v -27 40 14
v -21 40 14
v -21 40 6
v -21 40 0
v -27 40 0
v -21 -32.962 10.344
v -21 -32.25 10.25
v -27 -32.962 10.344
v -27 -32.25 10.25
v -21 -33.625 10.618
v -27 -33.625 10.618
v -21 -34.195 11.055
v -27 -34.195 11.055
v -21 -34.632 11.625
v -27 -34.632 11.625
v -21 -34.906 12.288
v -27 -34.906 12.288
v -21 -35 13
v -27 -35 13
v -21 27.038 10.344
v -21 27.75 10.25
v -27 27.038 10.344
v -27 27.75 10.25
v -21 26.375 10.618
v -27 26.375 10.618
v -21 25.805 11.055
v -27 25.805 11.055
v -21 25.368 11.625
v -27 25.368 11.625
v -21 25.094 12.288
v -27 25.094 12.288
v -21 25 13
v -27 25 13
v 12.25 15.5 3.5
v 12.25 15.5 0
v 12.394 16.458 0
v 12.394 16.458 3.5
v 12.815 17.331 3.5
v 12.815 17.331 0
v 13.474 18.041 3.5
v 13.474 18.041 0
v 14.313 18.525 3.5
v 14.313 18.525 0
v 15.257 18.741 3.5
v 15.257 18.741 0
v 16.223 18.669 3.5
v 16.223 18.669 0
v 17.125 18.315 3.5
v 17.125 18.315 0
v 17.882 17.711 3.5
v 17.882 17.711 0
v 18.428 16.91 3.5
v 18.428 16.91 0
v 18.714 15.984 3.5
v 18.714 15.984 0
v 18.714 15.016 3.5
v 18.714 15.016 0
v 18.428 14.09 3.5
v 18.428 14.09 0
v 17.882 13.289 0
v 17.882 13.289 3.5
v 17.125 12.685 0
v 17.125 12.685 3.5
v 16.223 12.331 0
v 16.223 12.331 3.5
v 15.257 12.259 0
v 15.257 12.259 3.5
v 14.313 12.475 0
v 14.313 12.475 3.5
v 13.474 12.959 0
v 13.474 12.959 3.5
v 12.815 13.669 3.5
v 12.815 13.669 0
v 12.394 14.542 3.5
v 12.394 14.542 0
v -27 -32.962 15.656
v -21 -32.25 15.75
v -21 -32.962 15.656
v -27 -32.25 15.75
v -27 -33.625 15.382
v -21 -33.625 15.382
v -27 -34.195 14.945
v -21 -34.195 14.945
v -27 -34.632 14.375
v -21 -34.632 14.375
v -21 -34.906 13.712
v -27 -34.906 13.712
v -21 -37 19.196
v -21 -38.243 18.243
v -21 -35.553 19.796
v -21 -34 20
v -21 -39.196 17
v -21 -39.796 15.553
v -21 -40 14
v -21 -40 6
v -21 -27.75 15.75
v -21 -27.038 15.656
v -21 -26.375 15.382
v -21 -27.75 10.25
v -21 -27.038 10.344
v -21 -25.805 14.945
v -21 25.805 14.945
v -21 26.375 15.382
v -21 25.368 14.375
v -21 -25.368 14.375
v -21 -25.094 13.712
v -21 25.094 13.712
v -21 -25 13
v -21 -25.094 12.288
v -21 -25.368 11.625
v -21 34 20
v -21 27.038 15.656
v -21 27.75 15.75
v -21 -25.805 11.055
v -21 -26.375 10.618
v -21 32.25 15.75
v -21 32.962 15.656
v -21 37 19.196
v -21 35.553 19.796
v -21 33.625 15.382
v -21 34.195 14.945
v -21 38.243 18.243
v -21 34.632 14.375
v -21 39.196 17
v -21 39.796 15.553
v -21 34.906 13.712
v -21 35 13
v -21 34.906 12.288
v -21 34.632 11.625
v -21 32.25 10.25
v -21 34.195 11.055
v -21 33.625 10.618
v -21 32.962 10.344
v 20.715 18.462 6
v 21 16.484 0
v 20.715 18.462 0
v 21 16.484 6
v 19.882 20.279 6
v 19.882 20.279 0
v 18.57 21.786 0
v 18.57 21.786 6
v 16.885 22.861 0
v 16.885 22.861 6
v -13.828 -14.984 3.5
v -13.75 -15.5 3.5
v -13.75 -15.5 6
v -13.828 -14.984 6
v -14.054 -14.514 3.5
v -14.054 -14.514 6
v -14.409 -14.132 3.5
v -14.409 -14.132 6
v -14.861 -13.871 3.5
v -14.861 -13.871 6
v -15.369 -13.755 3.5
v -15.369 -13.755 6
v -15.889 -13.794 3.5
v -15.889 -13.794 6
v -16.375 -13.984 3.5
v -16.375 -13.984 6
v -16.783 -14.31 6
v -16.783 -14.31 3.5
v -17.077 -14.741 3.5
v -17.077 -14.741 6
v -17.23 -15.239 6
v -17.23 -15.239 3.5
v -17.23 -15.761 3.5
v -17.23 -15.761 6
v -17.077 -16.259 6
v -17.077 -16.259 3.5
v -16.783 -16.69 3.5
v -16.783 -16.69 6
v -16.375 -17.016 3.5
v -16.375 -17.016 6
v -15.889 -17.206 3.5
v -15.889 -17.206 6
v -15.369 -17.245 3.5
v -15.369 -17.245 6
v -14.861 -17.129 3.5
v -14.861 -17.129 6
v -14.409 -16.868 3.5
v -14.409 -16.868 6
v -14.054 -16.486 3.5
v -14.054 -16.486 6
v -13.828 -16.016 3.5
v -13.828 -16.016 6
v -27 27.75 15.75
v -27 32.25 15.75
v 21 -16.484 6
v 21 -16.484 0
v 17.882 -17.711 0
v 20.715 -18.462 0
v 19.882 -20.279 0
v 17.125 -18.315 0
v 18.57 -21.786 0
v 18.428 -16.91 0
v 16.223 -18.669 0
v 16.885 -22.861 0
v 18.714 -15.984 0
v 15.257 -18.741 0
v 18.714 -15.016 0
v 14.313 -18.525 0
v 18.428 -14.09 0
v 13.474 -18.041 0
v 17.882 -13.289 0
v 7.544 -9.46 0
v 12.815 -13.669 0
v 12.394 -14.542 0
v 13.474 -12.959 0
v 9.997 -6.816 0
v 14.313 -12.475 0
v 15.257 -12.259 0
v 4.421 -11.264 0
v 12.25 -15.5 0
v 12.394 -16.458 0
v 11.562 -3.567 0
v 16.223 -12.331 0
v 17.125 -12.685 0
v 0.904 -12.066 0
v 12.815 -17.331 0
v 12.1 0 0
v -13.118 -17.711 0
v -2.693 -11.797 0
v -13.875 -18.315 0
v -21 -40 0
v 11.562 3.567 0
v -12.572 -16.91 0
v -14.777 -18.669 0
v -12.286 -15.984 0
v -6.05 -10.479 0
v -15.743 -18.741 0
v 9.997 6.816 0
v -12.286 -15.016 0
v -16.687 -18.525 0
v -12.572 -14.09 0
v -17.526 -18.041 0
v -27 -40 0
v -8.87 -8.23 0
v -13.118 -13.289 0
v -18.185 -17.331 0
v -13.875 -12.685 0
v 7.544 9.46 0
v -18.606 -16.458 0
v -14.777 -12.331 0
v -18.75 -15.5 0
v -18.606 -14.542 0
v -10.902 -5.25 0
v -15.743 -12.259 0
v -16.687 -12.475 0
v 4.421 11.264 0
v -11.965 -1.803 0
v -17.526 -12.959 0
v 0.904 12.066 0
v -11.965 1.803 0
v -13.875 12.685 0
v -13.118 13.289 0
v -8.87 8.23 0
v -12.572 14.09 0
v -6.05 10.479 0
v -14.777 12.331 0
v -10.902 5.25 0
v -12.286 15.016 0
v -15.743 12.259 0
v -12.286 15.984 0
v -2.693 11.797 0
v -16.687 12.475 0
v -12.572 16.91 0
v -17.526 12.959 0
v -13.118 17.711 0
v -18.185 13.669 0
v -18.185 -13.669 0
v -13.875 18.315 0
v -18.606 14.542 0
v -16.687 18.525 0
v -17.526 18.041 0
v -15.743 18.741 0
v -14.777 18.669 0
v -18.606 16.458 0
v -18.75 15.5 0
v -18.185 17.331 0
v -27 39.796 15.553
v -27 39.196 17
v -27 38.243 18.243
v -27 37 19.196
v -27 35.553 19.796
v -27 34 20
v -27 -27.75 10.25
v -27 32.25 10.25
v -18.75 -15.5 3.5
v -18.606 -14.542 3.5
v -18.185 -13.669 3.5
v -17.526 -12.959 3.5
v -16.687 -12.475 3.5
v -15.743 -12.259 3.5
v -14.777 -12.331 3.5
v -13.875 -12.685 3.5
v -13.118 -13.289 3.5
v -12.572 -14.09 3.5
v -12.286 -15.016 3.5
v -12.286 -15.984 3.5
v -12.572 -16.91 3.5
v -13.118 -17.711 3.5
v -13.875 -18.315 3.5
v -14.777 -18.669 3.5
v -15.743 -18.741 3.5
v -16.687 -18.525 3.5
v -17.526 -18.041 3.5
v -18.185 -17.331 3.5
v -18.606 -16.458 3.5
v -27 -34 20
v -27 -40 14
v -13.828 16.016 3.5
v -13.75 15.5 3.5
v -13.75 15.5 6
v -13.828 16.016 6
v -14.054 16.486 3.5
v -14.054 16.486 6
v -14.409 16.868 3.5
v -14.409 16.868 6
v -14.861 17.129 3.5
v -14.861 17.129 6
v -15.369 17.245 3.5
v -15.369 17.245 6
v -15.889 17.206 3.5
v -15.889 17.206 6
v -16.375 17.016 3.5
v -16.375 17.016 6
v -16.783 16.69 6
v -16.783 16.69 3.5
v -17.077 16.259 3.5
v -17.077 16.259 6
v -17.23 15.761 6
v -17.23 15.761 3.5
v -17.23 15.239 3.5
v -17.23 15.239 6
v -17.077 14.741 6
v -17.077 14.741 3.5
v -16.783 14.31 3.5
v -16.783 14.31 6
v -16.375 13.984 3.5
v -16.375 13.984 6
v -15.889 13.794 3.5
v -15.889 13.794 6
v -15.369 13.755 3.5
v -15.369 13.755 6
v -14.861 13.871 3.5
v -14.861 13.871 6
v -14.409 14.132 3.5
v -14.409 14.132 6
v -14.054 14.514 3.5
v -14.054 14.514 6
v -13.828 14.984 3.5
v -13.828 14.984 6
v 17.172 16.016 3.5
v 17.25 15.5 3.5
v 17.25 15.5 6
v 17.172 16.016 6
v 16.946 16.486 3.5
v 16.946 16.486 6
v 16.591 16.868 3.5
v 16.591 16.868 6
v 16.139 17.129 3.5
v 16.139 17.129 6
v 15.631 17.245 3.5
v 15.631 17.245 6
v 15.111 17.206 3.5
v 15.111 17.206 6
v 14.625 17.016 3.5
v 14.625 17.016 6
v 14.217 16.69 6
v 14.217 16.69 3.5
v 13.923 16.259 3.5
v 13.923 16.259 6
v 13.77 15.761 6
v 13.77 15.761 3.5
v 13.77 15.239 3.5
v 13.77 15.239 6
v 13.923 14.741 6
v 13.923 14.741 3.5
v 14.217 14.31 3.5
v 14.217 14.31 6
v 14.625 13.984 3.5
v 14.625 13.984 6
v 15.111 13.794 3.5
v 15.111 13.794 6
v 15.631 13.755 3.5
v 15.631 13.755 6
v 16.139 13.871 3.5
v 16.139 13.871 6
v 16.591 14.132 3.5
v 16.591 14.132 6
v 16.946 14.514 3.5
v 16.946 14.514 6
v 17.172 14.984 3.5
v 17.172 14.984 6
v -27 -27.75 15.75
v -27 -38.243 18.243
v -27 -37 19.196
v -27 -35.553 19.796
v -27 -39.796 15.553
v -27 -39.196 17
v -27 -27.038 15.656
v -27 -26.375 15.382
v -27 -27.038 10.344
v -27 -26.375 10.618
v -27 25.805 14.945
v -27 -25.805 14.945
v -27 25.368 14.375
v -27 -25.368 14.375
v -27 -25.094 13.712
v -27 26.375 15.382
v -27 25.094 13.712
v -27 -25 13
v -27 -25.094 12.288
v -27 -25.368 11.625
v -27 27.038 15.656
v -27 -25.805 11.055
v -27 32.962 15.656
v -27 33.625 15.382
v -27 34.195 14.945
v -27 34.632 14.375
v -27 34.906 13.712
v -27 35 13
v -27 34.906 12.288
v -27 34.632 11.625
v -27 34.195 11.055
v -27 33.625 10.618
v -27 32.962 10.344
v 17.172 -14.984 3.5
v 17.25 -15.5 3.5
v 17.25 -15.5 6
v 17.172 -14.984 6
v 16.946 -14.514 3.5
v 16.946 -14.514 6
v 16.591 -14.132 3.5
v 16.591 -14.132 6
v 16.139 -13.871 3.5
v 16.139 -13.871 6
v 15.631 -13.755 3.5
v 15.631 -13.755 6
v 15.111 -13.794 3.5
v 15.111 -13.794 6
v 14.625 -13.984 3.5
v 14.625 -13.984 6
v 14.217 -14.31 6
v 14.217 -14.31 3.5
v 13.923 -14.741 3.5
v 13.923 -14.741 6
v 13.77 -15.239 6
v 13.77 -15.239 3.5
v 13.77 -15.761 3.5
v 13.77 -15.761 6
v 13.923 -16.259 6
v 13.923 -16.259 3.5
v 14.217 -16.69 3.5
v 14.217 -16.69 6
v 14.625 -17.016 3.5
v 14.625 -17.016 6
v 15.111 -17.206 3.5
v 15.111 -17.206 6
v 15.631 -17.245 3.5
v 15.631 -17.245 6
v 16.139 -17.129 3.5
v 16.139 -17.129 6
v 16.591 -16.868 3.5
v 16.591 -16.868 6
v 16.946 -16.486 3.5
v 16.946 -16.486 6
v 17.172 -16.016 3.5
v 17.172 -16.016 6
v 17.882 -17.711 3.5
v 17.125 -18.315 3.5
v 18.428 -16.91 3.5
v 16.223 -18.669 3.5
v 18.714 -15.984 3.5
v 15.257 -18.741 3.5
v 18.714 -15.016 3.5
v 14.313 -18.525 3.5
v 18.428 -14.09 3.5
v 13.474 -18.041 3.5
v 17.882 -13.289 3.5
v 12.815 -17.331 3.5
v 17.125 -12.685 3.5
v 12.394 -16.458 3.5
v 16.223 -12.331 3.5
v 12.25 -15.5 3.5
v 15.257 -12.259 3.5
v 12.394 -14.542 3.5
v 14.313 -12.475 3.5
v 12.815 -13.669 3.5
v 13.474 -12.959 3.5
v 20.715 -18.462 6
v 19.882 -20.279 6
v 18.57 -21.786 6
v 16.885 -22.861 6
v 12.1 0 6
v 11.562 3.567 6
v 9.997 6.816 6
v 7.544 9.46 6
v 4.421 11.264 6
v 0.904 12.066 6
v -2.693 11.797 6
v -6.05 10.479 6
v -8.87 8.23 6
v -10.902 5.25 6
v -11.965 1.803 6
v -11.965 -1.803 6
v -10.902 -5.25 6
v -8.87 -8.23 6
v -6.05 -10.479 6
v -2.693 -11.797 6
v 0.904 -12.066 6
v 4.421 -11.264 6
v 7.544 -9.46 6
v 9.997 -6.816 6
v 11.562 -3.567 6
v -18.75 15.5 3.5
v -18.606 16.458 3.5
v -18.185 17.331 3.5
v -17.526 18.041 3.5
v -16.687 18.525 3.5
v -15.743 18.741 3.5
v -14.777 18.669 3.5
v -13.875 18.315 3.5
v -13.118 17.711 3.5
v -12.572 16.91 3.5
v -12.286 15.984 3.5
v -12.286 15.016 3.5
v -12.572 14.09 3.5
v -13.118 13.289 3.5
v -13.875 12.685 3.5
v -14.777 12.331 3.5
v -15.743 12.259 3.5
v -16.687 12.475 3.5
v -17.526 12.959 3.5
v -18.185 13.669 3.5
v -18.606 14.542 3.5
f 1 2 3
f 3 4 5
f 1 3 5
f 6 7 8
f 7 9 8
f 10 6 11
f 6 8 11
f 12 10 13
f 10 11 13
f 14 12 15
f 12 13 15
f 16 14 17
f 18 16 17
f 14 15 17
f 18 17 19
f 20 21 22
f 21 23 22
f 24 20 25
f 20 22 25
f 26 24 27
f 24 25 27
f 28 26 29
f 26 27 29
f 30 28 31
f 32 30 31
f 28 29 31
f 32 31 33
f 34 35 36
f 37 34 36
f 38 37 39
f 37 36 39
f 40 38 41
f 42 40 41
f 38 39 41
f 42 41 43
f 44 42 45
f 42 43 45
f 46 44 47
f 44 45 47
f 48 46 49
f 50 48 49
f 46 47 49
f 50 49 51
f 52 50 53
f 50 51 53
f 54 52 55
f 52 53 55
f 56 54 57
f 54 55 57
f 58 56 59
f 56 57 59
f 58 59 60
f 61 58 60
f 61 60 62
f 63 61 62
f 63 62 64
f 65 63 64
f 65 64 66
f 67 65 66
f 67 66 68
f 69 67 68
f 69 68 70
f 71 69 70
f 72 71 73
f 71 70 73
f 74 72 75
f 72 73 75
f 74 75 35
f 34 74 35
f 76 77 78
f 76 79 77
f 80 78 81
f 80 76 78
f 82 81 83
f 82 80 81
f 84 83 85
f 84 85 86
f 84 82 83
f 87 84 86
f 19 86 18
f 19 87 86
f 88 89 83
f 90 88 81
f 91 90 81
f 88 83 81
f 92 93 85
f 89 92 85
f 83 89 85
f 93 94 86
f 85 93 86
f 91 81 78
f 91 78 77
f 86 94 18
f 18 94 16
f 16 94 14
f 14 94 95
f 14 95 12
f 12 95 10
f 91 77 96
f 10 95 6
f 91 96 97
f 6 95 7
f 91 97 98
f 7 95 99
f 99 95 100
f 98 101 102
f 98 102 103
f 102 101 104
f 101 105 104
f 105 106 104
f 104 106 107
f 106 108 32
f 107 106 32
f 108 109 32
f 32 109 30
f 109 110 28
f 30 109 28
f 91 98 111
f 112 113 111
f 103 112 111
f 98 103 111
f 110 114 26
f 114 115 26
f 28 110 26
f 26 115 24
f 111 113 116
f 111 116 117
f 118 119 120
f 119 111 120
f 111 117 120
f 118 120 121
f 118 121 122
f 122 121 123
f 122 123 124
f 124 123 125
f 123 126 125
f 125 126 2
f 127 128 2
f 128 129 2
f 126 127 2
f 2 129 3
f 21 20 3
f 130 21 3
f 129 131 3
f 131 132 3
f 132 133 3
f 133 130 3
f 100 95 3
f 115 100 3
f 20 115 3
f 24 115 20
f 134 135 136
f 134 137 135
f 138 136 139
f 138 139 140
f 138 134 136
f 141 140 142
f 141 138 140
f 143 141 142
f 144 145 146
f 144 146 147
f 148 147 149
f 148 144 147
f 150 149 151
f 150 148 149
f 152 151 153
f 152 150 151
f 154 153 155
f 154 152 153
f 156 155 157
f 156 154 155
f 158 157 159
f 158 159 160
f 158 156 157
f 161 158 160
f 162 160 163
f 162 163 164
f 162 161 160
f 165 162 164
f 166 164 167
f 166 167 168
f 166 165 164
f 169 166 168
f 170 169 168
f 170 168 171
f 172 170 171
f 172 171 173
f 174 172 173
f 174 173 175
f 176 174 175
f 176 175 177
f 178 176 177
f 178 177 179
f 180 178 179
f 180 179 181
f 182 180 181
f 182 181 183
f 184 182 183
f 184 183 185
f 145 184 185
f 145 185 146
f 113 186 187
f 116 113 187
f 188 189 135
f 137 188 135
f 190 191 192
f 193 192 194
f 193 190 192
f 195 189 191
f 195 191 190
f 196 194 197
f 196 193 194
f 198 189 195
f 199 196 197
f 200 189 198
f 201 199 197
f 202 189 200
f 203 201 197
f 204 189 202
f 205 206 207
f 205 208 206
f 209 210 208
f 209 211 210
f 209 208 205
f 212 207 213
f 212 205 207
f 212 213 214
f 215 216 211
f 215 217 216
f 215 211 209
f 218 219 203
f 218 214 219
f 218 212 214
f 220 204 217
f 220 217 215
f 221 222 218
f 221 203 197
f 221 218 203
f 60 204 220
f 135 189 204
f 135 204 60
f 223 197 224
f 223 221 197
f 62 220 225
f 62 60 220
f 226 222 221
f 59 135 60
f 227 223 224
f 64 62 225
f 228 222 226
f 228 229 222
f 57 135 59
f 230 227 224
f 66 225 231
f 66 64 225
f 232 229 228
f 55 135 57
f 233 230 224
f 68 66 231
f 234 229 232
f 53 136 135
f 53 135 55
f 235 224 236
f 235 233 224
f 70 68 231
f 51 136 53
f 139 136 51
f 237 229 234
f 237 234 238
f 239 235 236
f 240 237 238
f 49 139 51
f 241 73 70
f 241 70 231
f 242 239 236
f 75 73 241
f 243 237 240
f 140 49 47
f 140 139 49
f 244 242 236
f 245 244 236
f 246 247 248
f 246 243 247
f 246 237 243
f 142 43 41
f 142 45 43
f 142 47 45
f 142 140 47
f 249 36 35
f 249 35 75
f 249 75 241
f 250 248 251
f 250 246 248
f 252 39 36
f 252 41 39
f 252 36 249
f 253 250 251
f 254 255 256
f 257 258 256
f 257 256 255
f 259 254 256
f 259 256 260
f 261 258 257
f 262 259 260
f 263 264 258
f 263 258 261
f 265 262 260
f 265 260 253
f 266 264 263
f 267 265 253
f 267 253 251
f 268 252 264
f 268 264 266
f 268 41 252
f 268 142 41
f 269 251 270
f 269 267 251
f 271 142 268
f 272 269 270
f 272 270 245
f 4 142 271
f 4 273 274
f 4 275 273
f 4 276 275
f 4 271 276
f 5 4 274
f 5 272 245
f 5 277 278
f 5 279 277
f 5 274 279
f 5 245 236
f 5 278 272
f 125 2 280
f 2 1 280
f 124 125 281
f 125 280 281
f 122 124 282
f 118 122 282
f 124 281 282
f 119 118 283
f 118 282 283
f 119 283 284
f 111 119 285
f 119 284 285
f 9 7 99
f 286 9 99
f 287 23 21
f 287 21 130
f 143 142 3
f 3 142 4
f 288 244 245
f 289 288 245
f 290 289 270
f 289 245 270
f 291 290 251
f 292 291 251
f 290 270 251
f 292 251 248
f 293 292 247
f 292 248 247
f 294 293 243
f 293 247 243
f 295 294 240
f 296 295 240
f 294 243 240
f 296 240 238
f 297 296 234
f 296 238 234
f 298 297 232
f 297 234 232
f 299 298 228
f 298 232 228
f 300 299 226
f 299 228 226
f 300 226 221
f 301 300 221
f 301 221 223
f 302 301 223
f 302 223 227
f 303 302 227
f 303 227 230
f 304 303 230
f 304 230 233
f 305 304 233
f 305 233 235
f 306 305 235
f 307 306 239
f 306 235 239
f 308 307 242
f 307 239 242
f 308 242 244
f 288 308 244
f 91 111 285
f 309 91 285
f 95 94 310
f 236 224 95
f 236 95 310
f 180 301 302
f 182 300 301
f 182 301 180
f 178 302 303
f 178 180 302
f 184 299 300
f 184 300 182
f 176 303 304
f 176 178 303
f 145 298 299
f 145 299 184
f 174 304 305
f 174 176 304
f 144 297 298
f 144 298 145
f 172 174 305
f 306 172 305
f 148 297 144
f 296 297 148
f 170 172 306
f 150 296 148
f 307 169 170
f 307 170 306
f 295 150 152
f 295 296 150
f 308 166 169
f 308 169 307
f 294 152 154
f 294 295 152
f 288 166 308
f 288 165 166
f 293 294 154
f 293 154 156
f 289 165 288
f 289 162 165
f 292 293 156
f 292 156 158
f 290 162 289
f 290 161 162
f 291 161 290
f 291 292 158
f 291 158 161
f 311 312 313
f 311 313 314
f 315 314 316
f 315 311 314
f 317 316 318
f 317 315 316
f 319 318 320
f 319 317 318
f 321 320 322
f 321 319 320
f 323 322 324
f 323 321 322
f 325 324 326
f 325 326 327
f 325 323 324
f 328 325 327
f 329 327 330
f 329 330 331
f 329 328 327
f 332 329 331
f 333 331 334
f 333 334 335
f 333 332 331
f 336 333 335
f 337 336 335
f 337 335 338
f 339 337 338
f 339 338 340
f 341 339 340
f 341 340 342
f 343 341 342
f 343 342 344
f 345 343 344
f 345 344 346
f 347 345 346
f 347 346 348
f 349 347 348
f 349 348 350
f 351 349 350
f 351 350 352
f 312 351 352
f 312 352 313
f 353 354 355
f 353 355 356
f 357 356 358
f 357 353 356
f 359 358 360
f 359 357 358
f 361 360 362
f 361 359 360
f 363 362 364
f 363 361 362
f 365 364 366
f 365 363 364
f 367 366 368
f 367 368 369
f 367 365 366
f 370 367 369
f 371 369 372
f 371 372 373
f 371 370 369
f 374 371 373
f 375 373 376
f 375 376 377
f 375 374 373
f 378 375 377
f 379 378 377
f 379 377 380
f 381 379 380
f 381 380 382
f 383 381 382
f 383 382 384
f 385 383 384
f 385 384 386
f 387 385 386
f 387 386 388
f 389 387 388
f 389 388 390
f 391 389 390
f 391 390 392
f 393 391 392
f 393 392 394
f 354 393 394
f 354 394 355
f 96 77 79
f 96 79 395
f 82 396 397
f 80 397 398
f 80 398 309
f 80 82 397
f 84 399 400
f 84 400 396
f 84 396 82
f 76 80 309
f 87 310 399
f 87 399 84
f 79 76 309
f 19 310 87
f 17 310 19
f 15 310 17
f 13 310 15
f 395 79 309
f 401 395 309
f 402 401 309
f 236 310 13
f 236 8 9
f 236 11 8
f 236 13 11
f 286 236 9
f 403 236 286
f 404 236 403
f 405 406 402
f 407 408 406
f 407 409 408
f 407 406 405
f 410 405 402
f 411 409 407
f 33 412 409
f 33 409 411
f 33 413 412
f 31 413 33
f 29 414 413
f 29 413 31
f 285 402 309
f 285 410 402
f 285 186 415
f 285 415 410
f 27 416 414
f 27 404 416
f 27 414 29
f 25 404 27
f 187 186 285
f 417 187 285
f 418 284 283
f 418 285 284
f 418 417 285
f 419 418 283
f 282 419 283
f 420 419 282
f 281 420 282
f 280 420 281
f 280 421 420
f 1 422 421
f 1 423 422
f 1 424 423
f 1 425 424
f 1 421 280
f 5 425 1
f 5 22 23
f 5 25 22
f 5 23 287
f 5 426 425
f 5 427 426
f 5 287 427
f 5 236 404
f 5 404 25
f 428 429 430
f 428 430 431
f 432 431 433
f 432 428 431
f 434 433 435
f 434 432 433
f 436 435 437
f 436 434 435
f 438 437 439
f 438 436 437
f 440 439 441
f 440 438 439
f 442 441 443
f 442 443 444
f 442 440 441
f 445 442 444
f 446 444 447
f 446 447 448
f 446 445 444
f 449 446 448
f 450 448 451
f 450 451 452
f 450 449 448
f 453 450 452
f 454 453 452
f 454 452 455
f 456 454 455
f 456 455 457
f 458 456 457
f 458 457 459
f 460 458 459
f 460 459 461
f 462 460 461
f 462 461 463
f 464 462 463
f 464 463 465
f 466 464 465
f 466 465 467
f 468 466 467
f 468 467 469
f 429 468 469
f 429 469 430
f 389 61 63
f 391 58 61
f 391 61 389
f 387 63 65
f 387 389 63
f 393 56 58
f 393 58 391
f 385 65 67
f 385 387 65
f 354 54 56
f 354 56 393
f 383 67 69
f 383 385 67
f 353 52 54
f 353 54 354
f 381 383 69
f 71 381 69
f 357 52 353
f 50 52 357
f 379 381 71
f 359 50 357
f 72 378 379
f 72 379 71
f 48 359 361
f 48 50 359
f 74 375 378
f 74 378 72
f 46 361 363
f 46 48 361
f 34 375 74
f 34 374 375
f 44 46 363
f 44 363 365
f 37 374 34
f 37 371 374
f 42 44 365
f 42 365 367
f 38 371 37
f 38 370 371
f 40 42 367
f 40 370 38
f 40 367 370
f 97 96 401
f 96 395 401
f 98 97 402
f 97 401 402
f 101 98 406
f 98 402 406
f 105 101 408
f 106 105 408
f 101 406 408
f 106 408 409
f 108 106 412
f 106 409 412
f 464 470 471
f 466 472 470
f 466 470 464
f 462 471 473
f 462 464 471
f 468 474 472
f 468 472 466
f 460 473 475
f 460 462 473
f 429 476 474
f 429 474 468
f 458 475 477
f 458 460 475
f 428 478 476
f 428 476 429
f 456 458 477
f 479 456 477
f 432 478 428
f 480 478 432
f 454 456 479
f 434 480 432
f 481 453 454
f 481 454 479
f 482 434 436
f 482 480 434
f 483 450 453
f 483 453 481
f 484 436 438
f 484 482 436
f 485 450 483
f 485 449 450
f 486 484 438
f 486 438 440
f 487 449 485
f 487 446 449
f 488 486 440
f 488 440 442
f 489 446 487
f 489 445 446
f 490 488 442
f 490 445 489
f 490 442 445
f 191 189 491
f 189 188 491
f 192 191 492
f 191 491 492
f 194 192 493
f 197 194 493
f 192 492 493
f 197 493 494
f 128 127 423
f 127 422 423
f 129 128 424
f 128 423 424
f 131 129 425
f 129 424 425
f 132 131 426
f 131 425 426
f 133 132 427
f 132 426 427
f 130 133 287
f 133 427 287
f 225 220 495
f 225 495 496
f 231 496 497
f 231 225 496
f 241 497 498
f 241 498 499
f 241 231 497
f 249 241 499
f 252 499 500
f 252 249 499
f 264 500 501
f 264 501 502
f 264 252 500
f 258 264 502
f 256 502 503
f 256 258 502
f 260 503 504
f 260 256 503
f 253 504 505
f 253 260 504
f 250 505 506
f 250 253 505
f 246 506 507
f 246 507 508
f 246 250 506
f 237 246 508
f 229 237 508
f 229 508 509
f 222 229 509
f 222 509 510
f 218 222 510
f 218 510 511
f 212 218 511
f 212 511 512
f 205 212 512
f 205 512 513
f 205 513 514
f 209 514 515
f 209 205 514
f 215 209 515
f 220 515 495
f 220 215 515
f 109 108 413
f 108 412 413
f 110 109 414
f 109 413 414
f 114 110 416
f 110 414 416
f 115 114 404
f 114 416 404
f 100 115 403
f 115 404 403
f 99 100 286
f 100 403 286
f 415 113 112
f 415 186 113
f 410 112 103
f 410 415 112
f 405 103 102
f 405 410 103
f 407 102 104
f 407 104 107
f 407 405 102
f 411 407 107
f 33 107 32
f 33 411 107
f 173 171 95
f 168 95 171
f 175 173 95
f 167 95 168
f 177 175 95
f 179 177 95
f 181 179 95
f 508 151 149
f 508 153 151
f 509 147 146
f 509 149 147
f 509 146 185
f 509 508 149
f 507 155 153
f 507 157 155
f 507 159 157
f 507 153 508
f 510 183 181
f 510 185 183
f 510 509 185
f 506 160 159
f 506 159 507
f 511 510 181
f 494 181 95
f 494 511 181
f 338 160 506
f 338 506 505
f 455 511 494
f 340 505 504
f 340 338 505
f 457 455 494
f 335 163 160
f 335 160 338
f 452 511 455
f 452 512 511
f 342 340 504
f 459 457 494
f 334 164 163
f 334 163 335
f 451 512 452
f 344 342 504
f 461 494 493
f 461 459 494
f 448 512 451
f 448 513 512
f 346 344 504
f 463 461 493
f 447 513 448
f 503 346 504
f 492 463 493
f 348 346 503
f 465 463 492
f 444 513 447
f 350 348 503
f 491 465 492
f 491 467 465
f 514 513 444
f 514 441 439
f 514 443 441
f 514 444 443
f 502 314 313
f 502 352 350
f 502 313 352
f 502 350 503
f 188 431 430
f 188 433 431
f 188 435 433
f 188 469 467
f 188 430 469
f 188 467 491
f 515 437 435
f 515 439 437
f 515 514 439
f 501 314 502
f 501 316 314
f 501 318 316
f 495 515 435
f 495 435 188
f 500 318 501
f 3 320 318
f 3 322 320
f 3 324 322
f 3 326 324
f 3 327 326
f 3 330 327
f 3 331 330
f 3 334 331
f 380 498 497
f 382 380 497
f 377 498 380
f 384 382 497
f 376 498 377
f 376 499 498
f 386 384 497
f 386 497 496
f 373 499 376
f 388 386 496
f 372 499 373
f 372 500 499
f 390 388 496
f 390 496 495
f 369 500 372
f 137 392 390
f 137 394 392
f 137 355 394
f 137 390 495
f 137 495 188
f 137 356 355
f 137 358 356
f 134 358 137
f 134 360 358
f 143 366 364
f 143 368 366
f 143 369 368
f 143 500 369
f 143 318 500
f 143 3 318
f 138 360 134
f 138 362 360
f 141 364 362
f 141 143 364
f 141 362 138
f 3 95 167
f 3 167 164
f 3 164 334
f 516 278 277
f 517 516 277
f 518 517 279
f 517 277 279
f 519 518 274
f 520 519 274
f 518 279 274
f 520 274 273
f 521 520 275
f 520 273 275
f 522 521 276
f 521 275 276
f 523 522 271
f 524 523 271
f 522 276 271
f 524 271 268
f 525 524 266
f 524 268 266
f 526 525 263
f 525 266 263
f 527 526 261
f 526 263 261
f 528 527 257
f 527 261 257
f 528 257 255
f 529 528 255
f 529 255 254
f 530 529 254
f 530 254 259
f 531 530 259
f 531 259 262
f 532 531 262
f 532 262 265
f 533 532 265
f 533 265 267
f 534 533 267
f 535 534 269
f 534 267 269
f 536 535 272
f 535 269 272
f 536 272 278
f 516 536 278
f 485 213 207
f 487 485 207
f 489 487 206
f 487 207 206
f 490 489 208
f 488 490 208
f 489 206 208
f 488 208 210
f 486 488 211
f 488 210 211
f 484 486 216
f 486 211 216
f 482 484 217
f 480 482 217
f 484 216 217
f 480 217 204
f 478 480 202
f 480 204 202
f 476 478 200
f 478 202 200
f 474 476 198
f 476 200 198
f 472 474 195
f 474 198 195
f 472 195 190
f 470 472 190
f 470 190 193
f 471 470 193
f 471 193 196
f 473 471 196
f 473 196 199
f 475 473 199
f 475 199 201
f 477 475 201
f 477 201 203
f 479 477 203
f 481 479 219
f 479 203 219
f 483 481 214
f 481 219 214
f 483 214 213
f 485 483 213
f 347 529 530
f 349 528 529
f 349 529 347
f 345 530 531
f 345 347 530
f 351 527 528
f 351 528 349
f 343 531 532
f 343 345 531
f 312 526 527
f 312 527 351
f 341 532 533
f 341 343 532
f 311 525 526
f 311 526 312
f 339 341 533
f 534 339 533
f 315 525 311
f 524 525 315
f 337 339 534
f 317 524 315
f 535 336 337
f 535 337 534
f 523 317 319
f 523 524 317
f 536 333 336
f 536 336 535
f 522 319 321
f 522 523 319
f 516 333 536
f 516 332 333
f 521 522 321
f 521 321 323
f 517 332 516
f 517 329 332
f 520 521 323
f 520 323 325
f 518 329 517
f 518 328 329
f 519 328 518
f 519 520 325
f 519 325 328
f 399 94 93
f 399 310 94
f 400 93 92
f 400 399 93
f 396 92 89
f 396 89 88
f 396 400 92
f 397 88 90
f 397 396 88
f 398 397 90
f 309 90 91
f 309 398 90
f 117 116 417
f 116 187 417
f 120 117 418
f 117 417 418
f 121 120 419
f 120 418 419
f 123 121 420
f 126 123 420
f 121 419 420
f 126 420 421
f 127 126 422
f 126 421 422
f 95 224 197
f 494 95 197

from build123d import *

# Parameters (mm, degrees)
SKETCH1_R           = 12.1
SKETCH1_R_2         = 1.75
BOSS_EXTRUDE1_DEPTH = 6
SKETCH2_R           = 3.25
CUT_EXTRUDE1_DEPTH  = 3.5
FILLET2_R           = 7
SKETCH4_W           = 6
SKETCH4_H           = 80
BOSS_EXTRUDE2_DEPTH = 20
SKETCH5_W           = 5.5
SKETCH5_H           = 10
CUT_EXTRUDE2_DEPTH  = 20
FILLET3_R           = 2.75
FILLET4_R           = 6


with BuildPart() as part:
    # Sketch1 → Boss-Extrude1 (new body)
    with BuildSketch(Plane.XY):
        Polygon((21, -21), (21, 21), (-21, 40), (-21, -40), align=None)
        Circle(SKETCH1_R, mode=Mode.SUBTRACT)
        with Locations((15.5, 15.5)):
            Circle(SKETCH1_R_2, mode=Mode.SUBTRACT)
        with Locations((15.5, -15.5)):
            Circle(SKETCH1_R_2, mode=Mode.SUBTRACT)
        with Locations((-15.5, -15.5)):
            Circle(SKETCH1_R_2, mode=Mode.SUBTRACT)
        with Locations((-15.5, 15.5)):
            Circle(SKETCH1_R_2, mode=Mode.SUBTRACT)
    extrude(amount=BOSS_EXTRUDE1_DEPTH)

    # Sketch2 → Cut-Extrude1 (cut)
    with BuildSketch(Plane(origin=(0, 0, 0), x_dir=(-1, 0, 0), z_dir=(0, 0, -1))):
        with Locations((-15.5, 15.5)):
            Circle(SKETCH2_R)
        with Locations((15.5, 15.5)):
            Circle(SKETCH2_R)
        with Locations((15.5, -15.5)):
            Circle(SKETCH2_R)
        with Locations((-15.5, -15.5)):
            Circle(SKETCH2_R)
    extrude(amount=-CUT_EXTRUDE1_DEPTH, mode=Mode.SUBTRACT)

    # Fillet2
    fillet2_edges = [part.edges().sort_by_distance(p)[0] for p in [
        (21, 21, 3),
        (21, -21, 3),
    ]]
    fillet(fillet2_edges, radius=FILLET2_R)

    # Sketch4 → Boss-Extrude2 (add)
    with BuildSketch(Plane(origin=(0, 0, 0), x_dir=(-1, 0, 0), z_dir=(0, 0, -1))):
        with Locations((24, 0)):
            Rectangle(SKETCH4_W, SKETCH4_H)
    extrude(amount=-BOSS_EXTRUDE2_DEPTH)

    # Sketch5 → Cut-Extrude2 (cut)
    with BuildSketch(Plane(origin=(-21, 0, 0), x_dir=(0, 0, -1), z_dir=(1, 0, 0))):
        with Locations((-13, -30)):
            Rectangle(SKETCH5_W, SKETCH5_H)
        with Locations((-13, 30)):
            Rectangle(SKETCH5_W, SKETCH5_H)
    extrude(amount=-CUT_EXTRUDE2_DEPTH, mode=Mode.SUBTRACT)

    # Fillet3
    fillet3_edges = [part.edges().sort_by_distance(p)[0] for p in [
        (-24, -25, 15.75),
        (-24, -25, 10.25),
        (-24, -35, 15.75),
        (-24, -35, 10.25),
        (-24, 35, 15.75),
        (-24, 25, 15.75),
        (-24, 25, 10.25),
        (-24, 35, 10.25),
    ]]
    fillet(fillet3_edges, radius=FILLET3_R - 0.0001)  # a hair under: the kernel refuses the full size

    # Fillet4
    fillet4_edges = [part.edges().sort_by_distance(p)[0] for p in [
        (-24, 40, 20),
        (-24, -40, 20),
    ]]
    fillet(fillet4_edges, radius=FILLET4_R)


solid = part.part
